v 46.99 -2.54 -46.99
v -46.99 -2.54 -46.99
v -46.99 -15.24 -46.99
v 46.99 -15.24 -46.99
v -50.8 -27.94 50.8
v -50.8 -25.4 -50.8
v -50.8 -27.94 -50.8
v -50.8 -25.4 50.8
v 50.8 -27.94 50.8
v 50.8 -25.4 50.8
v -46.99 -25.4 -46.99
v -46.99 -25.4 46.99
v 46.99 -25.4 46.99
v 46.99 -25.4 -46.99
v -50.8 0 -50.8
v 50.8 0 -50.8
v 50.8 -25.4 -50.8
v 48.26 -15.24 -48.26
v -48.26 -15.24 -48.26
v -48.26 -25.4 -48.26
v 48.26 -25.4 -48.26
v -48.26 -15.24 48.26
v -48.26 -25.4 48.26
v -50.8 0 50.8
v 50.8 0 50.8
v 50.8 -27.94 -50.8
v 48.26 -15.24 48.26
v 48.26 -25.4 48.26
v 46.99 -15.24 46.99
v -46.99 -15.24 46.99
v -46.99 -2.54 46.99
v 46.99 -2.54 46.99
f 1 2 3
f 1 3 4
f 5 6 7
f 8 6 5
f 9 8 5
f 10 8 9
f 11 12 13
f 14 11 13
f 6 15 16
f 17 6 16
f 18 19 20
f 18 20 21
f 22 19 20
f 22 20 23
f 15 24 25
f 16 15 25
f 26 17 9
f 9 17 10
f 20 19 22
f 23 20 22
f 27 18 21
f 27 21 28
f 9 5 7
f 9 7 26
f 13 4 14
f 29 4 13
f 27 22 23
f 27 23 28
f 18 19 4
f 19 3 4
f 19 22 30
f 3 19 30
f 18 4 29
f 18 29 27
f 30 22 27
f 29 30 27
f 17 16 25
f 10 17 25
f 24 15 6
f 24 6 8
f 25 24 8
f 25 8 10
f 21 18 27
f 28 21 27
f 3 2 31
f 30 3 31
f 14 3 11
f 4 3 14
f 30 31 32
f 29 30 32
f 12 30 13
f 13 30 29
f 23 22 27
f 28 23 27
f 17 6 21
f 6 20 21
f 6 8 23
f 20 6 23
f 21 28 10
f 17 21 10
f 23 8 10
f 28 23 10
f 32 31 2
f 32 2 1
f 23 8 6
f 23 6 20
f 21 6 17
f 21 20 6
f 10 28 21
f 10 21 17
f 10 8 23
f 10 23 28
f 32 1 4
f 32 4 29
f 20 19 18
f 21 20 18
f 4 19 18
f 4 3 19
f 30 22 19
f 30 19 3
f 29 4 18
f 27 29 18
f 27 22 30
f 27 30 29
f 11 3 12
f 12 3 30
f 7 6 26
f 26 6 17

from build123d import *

# Parameters (mm, degrees)
F0_W     = 101.6
F0_H     = 101.6
F1_DEPTH = 25.4
F5_T     = -2.54
F2_W     = 96.52
F2_H     = 96.52
F2_W_2   = 93.98
F2_H_2   = 93.98
F3_DEPTH = 12.7
F6_DEPTH = 12.7
F4_W     = 101.6
F4_H     = 101.6
F4_W_2   = 96.52
F4_H_2   = 96.52
F7_DEPTH = 2.54


with BuildPart() as f1:
    # F0 (on Front) → F1 (new body)
    with BuildSketch(Plane.XZ):
        Rectangle(F0_W, F0_H)
    extrude(amount=F1_DEPTH)

    # F5
    f5_openings = [f1.faces().sort_by_distance(p)[0] for p in [
        (0, -25.4, 0),
    ]]
    offset(amount=F5_T, openings=f5_openings)

    # F2 (on face) → F3 (join)
    with BuildSketch(Plane.XZ.offset(2.54)):
        Rectangle(F2_W, F2_H)
        Rectangle(F2_W_2, F2_H_2, mode=Mode.SUBTRACT)
    extrude(amount=F3_DEPTH)


with BuildPart() as f6:
    # F6 (new): a face of the model
    f6_faces = [f1.part.faces().sort_by_distance(p)[0] for p in [
        (-48.123500107, -15.24, 0),
    ]]
    extrude(f6_faces, amount=F6_DEPTH)

    # F4 (on face) → F7 (join)
    with BuildSketch(Plane.XZ.offset(25.4)):
        Rectangle(F4_W, F4_H)
        Rectangle(F4_W_2, F4_H_2)
    extrude(amount=F7_DEPTH)


solid = Compound([f1.part, f6.part])
